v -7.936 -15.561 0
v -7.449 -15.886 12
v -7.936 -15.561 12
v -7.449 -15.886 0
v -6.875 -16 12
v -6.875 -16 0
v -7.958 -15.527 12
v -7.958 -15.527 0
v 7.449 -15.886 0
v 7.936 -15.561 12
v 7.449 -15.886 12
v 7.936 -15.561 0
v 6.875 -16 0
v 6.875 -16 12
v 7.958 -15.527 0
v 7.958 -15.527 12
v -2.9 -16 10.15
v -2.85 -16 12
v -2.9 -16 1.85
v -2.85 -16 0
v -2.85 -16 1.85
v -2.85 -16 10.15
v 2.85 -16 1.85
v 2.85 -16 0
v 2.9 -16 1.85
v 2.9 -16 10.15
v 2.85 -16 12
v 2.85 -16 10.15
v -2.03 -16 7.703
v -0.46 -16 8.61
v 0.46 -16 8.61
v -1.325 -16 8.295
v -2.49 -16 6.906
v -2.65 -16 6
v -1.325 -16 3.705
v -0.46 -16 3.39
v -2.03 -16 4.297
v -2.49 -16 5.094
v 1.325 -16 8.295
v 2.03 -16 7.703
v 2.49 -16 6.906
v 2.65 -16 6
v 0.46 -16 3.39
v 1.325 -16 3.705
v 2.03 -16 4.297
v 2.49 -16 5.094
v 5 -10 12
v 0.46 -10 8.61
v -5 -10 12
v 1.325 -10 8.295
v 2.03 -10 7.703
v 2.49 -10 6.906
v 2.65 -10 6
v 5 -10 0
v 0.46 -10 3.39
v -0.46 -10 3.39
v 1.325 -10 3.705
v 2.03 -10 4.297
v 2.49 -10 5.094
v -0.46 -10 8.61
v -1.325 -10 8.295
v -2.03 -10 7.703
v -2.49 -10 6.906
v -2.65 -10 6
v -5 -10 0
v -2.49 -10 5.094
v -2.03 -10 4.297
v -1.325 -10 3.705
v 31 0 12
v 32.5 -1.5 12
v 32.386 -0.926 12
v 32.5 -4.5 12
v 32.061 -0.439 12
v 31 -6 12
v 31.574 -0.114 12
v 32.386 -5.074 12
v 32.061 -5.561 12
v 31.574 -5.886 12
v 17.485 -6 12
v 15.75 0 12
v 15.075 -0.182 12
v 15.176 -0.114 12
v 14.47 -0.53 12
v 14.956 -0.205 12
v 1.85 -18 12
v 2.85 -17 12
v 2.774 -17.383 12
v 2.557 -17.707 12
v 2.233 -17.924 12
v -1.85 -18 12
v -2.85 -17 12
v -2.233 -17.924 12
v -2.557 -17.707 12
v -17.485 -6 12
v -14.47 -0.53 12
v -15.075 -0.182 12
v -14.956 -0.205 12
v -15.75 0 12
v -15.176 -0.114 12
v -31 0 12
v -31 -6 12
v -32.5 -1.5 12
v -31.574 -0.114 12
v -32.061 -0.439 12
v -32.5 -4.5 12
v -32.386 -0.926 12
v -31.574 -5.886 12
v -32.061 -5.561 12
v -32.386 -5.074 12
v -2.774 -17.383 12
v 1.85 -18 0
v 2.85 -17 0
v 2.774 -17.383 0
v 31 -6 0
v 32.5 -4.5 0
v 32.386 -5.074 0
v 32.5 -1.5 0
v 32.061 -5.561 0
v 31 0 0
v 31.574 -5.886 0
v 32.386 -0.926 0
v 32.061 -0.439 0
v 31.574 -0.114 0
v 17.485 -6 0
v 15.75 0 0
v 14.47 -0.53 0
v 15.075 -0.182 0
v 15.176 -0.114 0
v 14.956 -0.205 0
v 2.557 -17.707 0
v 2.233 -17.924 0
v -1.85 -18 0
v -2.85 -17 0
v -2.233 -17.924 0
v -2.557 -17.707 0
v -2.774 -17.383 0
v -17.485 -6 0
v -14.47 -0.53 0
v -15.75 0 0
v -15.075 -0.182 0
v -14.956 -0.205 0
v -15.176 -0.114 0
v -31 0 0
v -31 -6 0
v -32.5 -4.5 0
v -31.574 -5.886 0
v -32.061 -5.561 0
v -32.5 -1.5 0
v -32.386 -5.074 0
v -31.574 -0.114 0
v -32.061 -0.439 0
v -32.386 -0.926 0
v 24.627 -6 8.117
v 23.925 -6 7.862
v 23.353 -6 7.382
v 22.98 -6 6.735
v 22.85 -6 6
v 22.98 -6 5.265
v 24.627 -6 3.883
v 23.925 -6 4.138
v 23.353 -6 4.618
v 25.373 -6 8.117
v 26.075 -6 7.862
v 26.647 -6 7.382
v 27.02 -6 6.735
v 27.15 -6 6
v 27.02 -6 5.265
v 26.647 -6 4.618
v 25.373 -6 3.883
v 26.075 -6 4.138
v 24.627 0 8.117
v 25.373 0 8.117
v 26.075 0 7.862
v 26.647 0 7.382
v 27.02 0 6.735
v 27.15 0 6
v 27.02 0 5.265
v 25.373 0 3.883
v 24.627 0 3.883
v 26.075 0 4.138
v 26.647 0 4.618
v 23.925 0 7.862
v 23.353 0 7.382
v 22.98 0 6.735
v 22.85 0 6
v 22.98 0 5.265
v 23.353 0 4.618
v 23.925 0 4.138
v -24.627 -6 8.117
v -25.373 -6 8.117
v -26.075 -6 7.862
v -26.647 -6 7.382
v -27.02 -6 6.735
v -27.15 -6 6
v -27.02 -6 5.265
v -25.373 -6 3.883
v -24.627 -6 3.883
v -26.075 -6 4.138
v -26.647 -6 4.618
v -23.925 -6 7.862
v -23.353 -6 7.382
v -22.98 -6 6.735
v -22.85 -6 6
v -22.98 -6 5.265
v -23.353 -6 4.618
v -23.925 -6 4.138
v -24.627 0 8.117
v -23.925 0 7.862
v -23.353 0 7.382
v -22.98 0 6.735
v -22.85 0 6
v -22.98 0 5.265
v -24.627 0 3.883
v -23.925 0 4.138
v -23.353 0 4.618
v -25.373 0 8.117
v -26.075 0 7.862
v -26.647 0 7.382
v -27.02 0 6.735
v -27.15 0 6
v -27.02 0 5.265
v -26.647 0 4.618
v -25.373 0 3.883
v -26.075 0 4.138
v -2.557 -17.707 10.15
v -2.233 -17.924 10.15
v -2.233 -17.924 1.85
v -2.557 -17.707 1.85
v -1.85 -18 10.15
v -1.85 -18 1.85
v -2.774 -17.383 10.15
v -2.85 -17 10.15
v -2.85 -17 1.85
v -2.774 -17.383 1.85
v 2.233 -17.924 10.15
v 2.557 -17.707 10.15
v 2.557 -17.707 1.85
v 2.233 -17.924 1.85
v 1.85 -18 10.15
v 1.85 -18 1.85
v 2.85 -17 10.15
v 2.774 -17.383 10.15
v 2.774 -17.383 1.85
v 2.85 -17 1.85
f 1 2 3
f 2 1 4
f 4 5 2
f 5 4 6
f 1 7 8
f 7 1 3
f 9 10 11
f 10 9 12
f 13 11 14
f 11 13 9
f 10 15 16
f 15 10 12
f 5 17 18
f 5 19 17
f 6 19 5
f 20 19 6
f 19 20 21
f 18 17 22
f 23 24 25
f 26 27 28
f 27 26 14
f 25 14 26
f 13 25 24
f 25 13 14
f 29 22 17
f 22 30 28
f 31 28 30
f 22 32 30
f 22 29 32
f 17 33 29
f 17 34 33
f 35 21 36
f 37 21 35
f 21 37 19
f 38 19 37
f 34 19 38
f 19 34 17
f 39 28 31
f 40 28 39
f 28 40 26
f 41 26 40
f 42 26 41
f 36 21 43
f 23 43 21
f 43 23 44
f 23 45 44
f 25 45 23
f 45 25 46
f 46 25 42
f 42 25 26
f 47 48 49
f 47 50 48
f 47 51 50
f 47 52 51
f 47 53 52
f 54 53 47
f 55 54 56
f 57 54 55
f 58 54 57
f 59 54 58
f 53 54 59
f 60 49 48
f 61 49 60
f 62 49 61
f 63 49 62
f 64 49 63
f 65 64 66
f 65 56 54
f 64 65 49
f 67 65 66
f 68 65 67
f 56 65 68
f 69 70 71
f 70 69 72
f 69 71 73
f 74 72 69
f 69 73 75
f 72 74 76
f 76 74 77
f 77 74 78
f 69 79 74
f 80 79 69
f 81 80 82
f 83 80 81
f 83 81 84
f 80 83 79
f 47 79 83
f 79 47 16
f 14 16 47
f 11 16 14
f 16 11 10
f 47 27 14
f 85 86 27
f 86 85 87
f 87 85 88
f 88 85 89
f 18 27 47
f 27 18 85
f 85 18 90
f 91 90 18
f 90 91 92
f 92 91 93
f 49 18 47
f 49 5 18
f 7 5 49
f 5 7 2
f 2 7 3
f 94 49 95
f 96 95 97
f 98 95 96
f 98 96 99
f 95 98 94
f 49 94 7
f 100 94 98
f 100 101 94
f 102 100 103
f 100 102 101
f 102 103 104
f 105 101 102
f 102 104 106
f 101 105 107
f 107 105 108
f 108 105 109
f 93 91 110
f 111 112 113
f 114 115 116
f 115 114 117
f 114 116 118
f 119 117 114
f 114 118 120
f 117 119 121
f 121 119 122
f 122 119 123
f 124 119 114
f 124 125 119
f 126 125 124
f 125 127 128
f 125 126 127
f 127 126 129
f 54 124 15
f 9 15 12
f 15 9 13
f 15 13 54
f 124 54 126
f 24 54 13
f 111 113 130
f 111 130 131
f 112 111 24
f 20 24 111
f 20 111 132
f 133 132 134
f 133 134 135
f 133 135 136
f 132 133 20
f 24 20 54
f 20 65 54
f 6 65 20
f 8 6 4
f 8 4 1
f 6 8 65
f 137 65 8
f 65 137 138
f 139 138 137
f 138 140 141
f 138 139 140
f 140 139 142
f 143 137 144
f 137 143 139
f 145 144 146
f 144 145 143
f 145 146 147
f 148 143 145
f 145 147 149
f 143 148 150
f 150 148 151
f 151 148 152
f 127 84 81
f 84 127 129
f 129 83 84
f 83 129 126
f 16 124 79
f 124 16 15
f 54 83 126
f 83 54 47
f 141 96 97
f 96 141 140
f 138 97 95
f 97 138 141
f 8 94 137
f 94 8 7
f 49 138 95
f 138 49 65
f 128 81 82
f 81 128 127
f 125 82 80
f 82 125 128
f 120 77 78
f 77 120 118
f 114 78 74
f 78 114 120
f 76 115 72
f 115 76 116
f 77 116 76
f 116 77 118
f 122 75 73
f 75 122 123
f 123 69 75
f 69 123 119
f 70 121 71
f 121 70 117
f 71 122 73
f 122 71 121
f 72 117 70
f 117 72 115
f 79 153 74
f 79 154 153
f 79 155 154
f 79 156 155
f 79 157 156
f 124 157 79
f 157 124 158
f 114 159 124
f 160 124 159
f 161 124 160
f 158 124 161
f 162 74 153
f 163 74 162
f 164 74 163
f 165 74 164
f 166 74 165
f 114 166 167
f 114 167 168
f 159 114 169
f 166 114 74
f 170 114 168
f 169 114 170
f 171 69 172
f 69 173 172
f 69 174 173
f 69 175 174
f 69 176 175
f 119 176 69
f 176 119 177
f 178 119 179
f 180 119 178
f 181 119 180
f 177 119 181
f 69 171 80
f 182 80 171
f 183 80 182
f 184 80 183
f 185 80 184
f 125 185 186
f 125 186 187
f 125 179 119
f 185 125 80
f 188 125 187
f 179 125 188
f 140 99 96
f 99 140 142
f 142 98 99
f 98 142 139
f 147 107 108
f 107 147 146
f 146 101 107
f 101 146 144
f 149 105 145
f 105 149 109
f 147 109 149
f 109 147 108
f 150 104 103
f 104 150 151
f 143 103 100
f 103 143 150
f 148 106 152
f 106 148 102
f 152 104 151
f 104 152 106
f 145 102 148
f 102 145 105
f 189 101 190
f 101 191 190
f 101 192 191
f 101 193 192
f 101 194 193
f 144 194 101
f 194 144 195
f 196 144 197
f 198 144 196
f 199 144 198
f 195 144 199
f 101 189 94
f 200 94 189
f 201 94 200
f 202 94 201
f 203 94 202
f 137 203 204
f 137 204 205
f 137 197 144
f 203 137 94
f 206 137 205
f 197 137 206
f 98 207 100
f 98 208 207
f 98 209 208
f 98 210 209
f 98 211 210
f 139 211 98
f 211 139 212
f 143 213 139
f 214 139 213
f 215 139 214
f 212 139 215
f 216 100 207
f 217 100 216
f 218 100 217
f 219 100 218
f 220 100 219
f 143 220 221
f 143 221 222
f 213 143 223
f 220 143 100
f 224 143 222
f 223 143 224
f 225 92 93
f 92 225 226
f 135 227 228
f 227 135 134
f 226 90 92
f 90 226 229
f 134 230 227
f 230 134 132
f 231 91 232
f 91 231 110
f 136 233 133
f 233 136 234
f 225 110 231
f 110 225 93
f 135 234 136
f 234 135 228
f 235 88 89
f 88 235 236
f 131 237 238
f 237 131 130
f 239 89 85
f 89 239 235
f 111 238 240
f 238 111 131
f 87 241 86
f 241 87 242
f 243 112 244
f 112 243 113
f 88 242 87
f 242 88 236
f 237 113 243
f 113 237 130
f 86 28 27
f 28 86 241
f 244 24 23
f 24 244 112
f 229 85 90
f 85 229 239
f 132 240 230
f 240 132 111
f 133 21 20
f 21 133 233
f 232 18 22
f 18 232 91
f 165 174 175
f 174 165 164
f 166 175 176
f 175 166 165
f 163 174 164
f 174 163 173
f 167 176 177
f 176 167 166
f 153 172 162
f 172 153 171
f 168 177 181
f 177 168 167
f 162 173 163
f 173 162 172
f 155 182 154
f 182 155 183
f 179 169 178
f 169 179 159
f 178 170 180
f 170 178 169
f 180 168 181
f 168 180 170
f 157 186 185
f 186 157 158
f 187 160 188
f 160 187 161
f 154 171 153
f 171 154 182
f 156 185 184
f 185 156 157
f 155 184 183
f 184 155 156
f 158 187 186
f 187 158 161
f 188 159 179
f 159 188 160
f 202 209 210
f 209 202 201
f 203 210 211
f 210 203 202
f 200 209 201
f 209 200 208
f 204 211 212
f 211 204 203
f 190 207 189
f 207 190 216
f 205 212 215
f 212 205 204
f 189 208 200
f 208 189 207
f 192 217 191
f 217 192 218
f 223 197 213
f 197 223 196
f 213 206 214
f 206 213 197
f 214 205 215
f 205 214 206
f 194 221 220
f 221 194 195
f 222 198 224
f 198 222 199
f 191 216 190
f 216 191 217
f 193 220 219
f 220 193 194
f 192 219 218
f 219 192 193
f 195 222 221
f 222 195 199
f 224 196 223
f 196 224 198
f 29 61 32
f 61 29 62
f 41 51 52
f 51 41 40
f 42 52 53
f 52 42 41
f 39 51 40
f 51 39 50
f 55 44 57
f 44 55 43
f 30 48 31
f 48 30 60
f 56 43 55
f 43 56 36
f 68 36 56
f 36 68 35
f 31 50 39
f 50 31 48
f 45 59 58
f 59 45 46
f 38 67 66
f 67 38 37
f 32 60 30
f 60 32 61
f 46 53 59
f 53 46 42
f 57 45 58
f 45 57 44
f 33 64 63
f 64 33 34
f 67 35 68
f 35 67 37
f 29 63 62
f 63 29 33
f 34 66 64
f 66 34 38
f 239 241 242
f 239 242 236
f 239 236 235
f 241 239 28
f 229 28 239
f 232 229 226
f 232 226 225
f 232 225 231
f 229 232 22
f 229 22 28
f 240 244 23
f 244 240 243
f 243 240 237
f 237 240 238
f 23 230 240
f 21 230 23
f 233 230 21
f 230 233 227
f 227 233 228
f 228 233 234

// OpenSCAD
psu_mount_hole_distance = 50; // [0.0:200.0]
psu_mount_hole_d = 4;         // [0.0:10.0]
frame_mount_hole_d = 5;       // [0.0:10.0]
extra_hole_d_tenth = 3;       // [0.0:9.0]
middle_piece_width = 10;      // [0.0:180.0]
middle_piece_height = 10;     // [0.0:30.0]
bracket_width = 12;           // [0.0:30.0]
rill_width = 5;               // [0.0:10.00]
extra_rill_width_tenth = 7;   // [0.0:9.0]

/* [Hidden] */
rill_height = 2;
rill_round_edge = 1;
bracket_round_edge = 1.5;
bracket_height = 6;
bracket_length_beyond_psu_hole = 7.5;

rotate([90,0,0])
difference()
{
  
  extra_rill_width = extra_rill_width_tenth / 10;
  
  union()
  {
    // Middle piece
    translate([-middle_piece_width/2 - bracket_round_edge*2.25, 0, middle_piece_height])
      cube_fillet([middle_piece_width+bracket_round_edge*4.5, bracket_width, bracket_height], vertical=[0,0,0,0], top=[0,bracket_round_edge,0,bracket_round_edge]);

    length = sqrt(2 * pow(middle_piece_height, 2));

    // Angled piece (+x)
    translate([middle_piece_width/2+middle_piece_height,bracket_width,0])
      rotate([0,-45,180])
        translate([-bracket_round_edge/2,0,0])
          cube_fillet([length+4.11, bracket_width, bracket_height], vertical=[0,0,0,0], top=[0,0,0,bracket_round_edge], bottom=[0,bracket_round_edge,0,bracket_round_edge]);

    // Angled piece (-x)
    translate([-middle_piece_width/2-middle_piece_height,0,0])
      rotate([0,-45,0])
        translate([-bracket_round_edge/2,0,0])  
          cube_fillet([length+4.11, bracket_width, bracket_height], vertical=[0,0,0,0], top=[0,0,0,bracket_round_edge], bottom=[0,bracket_round_edge,0,bracket_round_edge]);

    outer_piece_l = (psu_mount_hole_distance-middle_piece_width)/2-middle_piece_height+bracket_length_beyond_psu_hole+bracket_round_edge/2;

    // Outer piece (+x)
    translate([middle_piece_height + middle_piece_width/2 - bracket_round_edge/2,0,0])
      cube_fillet([outer_piece_l, bracket_width, bracket_height], vertical=[0,0,0,0], top=[0,0,0,bracket_round_edge], bottom=[0,bracket_round_edge,0,bracket_round_edge]);

    // Outer piece (-x)
    rotate([0,0,180])
      translate([middle_piece_height + middle_piece_width/2 - bracket_round_edge/2,-bracket_width,0])
        cube_fillet([outer_piece_l, bracket_width, bracket_height], vertical=[0,0,0,0], top=[0,0,0,bracket_round_edge], bottom=[0,bracket_round_edge,0,bracket_round_edge]);

    // Rill
    translate([-(rill_width+extra_rill_width)/2,0,bracket_height + middle_piece_height])
      cube_fillet([rill_width+extra_rill_width, bracket_width, rill_height], vertical=[0,0,0,0], top=[0,rill_round_edge,0,rill_round_edge]);
  }

  extra_hole_d = extra_hole_d_tenth / 10;

  // PSU Mounting holes
  translate([psu_mount_hole_distance/2, bracket_width/2, -0.05])
    cylinder(d=psu_mount_hole_d+extra_hole_d, h = bracket_height + 0.1, $fn=18);

  translate([-psu_mount_hole_distance/2,bracket_width/2,-0.05])
    cylinder(d=psu_mount_hole_d+extra_hole_d, h = bracket_height + 0.1, $fn=18);

  // Frame mounting hole
  translate([0, bracket_width/2, middle_piece_height-0.05])
    cylinder(d=frame_mount_hole_d+extra_hole_d, h = bracket_height + rill_height + 0.1, $fn=18);
  
  // Hole in the rill
  rill_hole_width = frame_mount_hole_d + extra_hole_d + 3;
    translate([-(rill_width+extra_rill_width)/2 - 0.05, bracket_width / 2 - rill_hole_width / 2,bracket_height + middle_piece_height])
      cube([rill_width+extra_rill_width + 0.1, rill_hole_width, rill_height+ 0.05]);
}


// http://axuv.blogspot.nl/2012/05/openscad-helper-funcions-for-better.html
module fillet(radius, height=100, $fn=16) {
    //this creates negative of fillet,
    //i.e. thing to be substracted from object
    translate([-radius, -radius, -height/2-0.01])
        difference() {
            cube([radius*2, radius*2, height+0.02]);
            cylinder(r=radius, h=height+0.02, $fn=16);
        }
}

module cube_negative_fillet(
        size,
        radius=-1,
        vertical=[3,3,3,3], 
        top=[0,0,0,0],
        bottom=[0,0,0,0],
        $fn=0
    ){

    j=[1,0,1,0];

    for (i=[0:3]) {
        if (radius > -1) {
            rotate([0, 0, 90*i])
                translate([size[1-j[i]]/2, size[j[i]]/2, 0])
                    fillet(radius, size[2], $fn=$fn);
        } else {
            rotate([0, 0, 90*i])
                translate([size[1-j[i]]/2, size[j[i]]/2, 0])
                    fillet(vertical[i], size[2], $fn=$fn);
        }
        rotate([90*i, -90, 0])
            translate([size[2]/2, size[j[i]]/2, 0 ])
                fillet(top[i], size[1-j[i]], $fn=$fn);
        rotate([90*(4-i), 90, 0])
            translate([size[2]/2, size[j[i]]/2, 0])
                fillet(bottom[i], size[1-j[i]], $fn=$fn);
    }
}

module cube_fillet_inside(
         size,
        radius=-1,
        vertical=[3,3,3,3],
        top=[0,0,0,0],
        bottom=[0,0,0,0],
        $fn=0
    ){
    if (radius == 0) {
        cube(size, center=true);
    } else {
        difference() {
            cube(size, center=true);
            cube_negative_fillet(size, radius, vertical, top, bottom, $fn);
        }
    }
}

module cube_fillet(
        size,
        radius=-1,
        vertical=[3,3,3,3],
        top=[0,0,0,0],
        bottom=[0,0,0,0],
        center=false,
        $fn=0 
    ){
    if (center) {
        cube_fillet_inside(size, radius, vertical, top, bottom, $fn);
    } else {
        translate([size[0]/2, size[1]/2, size[2]/2])
            cube_fillet_inside(size, radius, vertical, top, bottom, $fn);
    }
}
